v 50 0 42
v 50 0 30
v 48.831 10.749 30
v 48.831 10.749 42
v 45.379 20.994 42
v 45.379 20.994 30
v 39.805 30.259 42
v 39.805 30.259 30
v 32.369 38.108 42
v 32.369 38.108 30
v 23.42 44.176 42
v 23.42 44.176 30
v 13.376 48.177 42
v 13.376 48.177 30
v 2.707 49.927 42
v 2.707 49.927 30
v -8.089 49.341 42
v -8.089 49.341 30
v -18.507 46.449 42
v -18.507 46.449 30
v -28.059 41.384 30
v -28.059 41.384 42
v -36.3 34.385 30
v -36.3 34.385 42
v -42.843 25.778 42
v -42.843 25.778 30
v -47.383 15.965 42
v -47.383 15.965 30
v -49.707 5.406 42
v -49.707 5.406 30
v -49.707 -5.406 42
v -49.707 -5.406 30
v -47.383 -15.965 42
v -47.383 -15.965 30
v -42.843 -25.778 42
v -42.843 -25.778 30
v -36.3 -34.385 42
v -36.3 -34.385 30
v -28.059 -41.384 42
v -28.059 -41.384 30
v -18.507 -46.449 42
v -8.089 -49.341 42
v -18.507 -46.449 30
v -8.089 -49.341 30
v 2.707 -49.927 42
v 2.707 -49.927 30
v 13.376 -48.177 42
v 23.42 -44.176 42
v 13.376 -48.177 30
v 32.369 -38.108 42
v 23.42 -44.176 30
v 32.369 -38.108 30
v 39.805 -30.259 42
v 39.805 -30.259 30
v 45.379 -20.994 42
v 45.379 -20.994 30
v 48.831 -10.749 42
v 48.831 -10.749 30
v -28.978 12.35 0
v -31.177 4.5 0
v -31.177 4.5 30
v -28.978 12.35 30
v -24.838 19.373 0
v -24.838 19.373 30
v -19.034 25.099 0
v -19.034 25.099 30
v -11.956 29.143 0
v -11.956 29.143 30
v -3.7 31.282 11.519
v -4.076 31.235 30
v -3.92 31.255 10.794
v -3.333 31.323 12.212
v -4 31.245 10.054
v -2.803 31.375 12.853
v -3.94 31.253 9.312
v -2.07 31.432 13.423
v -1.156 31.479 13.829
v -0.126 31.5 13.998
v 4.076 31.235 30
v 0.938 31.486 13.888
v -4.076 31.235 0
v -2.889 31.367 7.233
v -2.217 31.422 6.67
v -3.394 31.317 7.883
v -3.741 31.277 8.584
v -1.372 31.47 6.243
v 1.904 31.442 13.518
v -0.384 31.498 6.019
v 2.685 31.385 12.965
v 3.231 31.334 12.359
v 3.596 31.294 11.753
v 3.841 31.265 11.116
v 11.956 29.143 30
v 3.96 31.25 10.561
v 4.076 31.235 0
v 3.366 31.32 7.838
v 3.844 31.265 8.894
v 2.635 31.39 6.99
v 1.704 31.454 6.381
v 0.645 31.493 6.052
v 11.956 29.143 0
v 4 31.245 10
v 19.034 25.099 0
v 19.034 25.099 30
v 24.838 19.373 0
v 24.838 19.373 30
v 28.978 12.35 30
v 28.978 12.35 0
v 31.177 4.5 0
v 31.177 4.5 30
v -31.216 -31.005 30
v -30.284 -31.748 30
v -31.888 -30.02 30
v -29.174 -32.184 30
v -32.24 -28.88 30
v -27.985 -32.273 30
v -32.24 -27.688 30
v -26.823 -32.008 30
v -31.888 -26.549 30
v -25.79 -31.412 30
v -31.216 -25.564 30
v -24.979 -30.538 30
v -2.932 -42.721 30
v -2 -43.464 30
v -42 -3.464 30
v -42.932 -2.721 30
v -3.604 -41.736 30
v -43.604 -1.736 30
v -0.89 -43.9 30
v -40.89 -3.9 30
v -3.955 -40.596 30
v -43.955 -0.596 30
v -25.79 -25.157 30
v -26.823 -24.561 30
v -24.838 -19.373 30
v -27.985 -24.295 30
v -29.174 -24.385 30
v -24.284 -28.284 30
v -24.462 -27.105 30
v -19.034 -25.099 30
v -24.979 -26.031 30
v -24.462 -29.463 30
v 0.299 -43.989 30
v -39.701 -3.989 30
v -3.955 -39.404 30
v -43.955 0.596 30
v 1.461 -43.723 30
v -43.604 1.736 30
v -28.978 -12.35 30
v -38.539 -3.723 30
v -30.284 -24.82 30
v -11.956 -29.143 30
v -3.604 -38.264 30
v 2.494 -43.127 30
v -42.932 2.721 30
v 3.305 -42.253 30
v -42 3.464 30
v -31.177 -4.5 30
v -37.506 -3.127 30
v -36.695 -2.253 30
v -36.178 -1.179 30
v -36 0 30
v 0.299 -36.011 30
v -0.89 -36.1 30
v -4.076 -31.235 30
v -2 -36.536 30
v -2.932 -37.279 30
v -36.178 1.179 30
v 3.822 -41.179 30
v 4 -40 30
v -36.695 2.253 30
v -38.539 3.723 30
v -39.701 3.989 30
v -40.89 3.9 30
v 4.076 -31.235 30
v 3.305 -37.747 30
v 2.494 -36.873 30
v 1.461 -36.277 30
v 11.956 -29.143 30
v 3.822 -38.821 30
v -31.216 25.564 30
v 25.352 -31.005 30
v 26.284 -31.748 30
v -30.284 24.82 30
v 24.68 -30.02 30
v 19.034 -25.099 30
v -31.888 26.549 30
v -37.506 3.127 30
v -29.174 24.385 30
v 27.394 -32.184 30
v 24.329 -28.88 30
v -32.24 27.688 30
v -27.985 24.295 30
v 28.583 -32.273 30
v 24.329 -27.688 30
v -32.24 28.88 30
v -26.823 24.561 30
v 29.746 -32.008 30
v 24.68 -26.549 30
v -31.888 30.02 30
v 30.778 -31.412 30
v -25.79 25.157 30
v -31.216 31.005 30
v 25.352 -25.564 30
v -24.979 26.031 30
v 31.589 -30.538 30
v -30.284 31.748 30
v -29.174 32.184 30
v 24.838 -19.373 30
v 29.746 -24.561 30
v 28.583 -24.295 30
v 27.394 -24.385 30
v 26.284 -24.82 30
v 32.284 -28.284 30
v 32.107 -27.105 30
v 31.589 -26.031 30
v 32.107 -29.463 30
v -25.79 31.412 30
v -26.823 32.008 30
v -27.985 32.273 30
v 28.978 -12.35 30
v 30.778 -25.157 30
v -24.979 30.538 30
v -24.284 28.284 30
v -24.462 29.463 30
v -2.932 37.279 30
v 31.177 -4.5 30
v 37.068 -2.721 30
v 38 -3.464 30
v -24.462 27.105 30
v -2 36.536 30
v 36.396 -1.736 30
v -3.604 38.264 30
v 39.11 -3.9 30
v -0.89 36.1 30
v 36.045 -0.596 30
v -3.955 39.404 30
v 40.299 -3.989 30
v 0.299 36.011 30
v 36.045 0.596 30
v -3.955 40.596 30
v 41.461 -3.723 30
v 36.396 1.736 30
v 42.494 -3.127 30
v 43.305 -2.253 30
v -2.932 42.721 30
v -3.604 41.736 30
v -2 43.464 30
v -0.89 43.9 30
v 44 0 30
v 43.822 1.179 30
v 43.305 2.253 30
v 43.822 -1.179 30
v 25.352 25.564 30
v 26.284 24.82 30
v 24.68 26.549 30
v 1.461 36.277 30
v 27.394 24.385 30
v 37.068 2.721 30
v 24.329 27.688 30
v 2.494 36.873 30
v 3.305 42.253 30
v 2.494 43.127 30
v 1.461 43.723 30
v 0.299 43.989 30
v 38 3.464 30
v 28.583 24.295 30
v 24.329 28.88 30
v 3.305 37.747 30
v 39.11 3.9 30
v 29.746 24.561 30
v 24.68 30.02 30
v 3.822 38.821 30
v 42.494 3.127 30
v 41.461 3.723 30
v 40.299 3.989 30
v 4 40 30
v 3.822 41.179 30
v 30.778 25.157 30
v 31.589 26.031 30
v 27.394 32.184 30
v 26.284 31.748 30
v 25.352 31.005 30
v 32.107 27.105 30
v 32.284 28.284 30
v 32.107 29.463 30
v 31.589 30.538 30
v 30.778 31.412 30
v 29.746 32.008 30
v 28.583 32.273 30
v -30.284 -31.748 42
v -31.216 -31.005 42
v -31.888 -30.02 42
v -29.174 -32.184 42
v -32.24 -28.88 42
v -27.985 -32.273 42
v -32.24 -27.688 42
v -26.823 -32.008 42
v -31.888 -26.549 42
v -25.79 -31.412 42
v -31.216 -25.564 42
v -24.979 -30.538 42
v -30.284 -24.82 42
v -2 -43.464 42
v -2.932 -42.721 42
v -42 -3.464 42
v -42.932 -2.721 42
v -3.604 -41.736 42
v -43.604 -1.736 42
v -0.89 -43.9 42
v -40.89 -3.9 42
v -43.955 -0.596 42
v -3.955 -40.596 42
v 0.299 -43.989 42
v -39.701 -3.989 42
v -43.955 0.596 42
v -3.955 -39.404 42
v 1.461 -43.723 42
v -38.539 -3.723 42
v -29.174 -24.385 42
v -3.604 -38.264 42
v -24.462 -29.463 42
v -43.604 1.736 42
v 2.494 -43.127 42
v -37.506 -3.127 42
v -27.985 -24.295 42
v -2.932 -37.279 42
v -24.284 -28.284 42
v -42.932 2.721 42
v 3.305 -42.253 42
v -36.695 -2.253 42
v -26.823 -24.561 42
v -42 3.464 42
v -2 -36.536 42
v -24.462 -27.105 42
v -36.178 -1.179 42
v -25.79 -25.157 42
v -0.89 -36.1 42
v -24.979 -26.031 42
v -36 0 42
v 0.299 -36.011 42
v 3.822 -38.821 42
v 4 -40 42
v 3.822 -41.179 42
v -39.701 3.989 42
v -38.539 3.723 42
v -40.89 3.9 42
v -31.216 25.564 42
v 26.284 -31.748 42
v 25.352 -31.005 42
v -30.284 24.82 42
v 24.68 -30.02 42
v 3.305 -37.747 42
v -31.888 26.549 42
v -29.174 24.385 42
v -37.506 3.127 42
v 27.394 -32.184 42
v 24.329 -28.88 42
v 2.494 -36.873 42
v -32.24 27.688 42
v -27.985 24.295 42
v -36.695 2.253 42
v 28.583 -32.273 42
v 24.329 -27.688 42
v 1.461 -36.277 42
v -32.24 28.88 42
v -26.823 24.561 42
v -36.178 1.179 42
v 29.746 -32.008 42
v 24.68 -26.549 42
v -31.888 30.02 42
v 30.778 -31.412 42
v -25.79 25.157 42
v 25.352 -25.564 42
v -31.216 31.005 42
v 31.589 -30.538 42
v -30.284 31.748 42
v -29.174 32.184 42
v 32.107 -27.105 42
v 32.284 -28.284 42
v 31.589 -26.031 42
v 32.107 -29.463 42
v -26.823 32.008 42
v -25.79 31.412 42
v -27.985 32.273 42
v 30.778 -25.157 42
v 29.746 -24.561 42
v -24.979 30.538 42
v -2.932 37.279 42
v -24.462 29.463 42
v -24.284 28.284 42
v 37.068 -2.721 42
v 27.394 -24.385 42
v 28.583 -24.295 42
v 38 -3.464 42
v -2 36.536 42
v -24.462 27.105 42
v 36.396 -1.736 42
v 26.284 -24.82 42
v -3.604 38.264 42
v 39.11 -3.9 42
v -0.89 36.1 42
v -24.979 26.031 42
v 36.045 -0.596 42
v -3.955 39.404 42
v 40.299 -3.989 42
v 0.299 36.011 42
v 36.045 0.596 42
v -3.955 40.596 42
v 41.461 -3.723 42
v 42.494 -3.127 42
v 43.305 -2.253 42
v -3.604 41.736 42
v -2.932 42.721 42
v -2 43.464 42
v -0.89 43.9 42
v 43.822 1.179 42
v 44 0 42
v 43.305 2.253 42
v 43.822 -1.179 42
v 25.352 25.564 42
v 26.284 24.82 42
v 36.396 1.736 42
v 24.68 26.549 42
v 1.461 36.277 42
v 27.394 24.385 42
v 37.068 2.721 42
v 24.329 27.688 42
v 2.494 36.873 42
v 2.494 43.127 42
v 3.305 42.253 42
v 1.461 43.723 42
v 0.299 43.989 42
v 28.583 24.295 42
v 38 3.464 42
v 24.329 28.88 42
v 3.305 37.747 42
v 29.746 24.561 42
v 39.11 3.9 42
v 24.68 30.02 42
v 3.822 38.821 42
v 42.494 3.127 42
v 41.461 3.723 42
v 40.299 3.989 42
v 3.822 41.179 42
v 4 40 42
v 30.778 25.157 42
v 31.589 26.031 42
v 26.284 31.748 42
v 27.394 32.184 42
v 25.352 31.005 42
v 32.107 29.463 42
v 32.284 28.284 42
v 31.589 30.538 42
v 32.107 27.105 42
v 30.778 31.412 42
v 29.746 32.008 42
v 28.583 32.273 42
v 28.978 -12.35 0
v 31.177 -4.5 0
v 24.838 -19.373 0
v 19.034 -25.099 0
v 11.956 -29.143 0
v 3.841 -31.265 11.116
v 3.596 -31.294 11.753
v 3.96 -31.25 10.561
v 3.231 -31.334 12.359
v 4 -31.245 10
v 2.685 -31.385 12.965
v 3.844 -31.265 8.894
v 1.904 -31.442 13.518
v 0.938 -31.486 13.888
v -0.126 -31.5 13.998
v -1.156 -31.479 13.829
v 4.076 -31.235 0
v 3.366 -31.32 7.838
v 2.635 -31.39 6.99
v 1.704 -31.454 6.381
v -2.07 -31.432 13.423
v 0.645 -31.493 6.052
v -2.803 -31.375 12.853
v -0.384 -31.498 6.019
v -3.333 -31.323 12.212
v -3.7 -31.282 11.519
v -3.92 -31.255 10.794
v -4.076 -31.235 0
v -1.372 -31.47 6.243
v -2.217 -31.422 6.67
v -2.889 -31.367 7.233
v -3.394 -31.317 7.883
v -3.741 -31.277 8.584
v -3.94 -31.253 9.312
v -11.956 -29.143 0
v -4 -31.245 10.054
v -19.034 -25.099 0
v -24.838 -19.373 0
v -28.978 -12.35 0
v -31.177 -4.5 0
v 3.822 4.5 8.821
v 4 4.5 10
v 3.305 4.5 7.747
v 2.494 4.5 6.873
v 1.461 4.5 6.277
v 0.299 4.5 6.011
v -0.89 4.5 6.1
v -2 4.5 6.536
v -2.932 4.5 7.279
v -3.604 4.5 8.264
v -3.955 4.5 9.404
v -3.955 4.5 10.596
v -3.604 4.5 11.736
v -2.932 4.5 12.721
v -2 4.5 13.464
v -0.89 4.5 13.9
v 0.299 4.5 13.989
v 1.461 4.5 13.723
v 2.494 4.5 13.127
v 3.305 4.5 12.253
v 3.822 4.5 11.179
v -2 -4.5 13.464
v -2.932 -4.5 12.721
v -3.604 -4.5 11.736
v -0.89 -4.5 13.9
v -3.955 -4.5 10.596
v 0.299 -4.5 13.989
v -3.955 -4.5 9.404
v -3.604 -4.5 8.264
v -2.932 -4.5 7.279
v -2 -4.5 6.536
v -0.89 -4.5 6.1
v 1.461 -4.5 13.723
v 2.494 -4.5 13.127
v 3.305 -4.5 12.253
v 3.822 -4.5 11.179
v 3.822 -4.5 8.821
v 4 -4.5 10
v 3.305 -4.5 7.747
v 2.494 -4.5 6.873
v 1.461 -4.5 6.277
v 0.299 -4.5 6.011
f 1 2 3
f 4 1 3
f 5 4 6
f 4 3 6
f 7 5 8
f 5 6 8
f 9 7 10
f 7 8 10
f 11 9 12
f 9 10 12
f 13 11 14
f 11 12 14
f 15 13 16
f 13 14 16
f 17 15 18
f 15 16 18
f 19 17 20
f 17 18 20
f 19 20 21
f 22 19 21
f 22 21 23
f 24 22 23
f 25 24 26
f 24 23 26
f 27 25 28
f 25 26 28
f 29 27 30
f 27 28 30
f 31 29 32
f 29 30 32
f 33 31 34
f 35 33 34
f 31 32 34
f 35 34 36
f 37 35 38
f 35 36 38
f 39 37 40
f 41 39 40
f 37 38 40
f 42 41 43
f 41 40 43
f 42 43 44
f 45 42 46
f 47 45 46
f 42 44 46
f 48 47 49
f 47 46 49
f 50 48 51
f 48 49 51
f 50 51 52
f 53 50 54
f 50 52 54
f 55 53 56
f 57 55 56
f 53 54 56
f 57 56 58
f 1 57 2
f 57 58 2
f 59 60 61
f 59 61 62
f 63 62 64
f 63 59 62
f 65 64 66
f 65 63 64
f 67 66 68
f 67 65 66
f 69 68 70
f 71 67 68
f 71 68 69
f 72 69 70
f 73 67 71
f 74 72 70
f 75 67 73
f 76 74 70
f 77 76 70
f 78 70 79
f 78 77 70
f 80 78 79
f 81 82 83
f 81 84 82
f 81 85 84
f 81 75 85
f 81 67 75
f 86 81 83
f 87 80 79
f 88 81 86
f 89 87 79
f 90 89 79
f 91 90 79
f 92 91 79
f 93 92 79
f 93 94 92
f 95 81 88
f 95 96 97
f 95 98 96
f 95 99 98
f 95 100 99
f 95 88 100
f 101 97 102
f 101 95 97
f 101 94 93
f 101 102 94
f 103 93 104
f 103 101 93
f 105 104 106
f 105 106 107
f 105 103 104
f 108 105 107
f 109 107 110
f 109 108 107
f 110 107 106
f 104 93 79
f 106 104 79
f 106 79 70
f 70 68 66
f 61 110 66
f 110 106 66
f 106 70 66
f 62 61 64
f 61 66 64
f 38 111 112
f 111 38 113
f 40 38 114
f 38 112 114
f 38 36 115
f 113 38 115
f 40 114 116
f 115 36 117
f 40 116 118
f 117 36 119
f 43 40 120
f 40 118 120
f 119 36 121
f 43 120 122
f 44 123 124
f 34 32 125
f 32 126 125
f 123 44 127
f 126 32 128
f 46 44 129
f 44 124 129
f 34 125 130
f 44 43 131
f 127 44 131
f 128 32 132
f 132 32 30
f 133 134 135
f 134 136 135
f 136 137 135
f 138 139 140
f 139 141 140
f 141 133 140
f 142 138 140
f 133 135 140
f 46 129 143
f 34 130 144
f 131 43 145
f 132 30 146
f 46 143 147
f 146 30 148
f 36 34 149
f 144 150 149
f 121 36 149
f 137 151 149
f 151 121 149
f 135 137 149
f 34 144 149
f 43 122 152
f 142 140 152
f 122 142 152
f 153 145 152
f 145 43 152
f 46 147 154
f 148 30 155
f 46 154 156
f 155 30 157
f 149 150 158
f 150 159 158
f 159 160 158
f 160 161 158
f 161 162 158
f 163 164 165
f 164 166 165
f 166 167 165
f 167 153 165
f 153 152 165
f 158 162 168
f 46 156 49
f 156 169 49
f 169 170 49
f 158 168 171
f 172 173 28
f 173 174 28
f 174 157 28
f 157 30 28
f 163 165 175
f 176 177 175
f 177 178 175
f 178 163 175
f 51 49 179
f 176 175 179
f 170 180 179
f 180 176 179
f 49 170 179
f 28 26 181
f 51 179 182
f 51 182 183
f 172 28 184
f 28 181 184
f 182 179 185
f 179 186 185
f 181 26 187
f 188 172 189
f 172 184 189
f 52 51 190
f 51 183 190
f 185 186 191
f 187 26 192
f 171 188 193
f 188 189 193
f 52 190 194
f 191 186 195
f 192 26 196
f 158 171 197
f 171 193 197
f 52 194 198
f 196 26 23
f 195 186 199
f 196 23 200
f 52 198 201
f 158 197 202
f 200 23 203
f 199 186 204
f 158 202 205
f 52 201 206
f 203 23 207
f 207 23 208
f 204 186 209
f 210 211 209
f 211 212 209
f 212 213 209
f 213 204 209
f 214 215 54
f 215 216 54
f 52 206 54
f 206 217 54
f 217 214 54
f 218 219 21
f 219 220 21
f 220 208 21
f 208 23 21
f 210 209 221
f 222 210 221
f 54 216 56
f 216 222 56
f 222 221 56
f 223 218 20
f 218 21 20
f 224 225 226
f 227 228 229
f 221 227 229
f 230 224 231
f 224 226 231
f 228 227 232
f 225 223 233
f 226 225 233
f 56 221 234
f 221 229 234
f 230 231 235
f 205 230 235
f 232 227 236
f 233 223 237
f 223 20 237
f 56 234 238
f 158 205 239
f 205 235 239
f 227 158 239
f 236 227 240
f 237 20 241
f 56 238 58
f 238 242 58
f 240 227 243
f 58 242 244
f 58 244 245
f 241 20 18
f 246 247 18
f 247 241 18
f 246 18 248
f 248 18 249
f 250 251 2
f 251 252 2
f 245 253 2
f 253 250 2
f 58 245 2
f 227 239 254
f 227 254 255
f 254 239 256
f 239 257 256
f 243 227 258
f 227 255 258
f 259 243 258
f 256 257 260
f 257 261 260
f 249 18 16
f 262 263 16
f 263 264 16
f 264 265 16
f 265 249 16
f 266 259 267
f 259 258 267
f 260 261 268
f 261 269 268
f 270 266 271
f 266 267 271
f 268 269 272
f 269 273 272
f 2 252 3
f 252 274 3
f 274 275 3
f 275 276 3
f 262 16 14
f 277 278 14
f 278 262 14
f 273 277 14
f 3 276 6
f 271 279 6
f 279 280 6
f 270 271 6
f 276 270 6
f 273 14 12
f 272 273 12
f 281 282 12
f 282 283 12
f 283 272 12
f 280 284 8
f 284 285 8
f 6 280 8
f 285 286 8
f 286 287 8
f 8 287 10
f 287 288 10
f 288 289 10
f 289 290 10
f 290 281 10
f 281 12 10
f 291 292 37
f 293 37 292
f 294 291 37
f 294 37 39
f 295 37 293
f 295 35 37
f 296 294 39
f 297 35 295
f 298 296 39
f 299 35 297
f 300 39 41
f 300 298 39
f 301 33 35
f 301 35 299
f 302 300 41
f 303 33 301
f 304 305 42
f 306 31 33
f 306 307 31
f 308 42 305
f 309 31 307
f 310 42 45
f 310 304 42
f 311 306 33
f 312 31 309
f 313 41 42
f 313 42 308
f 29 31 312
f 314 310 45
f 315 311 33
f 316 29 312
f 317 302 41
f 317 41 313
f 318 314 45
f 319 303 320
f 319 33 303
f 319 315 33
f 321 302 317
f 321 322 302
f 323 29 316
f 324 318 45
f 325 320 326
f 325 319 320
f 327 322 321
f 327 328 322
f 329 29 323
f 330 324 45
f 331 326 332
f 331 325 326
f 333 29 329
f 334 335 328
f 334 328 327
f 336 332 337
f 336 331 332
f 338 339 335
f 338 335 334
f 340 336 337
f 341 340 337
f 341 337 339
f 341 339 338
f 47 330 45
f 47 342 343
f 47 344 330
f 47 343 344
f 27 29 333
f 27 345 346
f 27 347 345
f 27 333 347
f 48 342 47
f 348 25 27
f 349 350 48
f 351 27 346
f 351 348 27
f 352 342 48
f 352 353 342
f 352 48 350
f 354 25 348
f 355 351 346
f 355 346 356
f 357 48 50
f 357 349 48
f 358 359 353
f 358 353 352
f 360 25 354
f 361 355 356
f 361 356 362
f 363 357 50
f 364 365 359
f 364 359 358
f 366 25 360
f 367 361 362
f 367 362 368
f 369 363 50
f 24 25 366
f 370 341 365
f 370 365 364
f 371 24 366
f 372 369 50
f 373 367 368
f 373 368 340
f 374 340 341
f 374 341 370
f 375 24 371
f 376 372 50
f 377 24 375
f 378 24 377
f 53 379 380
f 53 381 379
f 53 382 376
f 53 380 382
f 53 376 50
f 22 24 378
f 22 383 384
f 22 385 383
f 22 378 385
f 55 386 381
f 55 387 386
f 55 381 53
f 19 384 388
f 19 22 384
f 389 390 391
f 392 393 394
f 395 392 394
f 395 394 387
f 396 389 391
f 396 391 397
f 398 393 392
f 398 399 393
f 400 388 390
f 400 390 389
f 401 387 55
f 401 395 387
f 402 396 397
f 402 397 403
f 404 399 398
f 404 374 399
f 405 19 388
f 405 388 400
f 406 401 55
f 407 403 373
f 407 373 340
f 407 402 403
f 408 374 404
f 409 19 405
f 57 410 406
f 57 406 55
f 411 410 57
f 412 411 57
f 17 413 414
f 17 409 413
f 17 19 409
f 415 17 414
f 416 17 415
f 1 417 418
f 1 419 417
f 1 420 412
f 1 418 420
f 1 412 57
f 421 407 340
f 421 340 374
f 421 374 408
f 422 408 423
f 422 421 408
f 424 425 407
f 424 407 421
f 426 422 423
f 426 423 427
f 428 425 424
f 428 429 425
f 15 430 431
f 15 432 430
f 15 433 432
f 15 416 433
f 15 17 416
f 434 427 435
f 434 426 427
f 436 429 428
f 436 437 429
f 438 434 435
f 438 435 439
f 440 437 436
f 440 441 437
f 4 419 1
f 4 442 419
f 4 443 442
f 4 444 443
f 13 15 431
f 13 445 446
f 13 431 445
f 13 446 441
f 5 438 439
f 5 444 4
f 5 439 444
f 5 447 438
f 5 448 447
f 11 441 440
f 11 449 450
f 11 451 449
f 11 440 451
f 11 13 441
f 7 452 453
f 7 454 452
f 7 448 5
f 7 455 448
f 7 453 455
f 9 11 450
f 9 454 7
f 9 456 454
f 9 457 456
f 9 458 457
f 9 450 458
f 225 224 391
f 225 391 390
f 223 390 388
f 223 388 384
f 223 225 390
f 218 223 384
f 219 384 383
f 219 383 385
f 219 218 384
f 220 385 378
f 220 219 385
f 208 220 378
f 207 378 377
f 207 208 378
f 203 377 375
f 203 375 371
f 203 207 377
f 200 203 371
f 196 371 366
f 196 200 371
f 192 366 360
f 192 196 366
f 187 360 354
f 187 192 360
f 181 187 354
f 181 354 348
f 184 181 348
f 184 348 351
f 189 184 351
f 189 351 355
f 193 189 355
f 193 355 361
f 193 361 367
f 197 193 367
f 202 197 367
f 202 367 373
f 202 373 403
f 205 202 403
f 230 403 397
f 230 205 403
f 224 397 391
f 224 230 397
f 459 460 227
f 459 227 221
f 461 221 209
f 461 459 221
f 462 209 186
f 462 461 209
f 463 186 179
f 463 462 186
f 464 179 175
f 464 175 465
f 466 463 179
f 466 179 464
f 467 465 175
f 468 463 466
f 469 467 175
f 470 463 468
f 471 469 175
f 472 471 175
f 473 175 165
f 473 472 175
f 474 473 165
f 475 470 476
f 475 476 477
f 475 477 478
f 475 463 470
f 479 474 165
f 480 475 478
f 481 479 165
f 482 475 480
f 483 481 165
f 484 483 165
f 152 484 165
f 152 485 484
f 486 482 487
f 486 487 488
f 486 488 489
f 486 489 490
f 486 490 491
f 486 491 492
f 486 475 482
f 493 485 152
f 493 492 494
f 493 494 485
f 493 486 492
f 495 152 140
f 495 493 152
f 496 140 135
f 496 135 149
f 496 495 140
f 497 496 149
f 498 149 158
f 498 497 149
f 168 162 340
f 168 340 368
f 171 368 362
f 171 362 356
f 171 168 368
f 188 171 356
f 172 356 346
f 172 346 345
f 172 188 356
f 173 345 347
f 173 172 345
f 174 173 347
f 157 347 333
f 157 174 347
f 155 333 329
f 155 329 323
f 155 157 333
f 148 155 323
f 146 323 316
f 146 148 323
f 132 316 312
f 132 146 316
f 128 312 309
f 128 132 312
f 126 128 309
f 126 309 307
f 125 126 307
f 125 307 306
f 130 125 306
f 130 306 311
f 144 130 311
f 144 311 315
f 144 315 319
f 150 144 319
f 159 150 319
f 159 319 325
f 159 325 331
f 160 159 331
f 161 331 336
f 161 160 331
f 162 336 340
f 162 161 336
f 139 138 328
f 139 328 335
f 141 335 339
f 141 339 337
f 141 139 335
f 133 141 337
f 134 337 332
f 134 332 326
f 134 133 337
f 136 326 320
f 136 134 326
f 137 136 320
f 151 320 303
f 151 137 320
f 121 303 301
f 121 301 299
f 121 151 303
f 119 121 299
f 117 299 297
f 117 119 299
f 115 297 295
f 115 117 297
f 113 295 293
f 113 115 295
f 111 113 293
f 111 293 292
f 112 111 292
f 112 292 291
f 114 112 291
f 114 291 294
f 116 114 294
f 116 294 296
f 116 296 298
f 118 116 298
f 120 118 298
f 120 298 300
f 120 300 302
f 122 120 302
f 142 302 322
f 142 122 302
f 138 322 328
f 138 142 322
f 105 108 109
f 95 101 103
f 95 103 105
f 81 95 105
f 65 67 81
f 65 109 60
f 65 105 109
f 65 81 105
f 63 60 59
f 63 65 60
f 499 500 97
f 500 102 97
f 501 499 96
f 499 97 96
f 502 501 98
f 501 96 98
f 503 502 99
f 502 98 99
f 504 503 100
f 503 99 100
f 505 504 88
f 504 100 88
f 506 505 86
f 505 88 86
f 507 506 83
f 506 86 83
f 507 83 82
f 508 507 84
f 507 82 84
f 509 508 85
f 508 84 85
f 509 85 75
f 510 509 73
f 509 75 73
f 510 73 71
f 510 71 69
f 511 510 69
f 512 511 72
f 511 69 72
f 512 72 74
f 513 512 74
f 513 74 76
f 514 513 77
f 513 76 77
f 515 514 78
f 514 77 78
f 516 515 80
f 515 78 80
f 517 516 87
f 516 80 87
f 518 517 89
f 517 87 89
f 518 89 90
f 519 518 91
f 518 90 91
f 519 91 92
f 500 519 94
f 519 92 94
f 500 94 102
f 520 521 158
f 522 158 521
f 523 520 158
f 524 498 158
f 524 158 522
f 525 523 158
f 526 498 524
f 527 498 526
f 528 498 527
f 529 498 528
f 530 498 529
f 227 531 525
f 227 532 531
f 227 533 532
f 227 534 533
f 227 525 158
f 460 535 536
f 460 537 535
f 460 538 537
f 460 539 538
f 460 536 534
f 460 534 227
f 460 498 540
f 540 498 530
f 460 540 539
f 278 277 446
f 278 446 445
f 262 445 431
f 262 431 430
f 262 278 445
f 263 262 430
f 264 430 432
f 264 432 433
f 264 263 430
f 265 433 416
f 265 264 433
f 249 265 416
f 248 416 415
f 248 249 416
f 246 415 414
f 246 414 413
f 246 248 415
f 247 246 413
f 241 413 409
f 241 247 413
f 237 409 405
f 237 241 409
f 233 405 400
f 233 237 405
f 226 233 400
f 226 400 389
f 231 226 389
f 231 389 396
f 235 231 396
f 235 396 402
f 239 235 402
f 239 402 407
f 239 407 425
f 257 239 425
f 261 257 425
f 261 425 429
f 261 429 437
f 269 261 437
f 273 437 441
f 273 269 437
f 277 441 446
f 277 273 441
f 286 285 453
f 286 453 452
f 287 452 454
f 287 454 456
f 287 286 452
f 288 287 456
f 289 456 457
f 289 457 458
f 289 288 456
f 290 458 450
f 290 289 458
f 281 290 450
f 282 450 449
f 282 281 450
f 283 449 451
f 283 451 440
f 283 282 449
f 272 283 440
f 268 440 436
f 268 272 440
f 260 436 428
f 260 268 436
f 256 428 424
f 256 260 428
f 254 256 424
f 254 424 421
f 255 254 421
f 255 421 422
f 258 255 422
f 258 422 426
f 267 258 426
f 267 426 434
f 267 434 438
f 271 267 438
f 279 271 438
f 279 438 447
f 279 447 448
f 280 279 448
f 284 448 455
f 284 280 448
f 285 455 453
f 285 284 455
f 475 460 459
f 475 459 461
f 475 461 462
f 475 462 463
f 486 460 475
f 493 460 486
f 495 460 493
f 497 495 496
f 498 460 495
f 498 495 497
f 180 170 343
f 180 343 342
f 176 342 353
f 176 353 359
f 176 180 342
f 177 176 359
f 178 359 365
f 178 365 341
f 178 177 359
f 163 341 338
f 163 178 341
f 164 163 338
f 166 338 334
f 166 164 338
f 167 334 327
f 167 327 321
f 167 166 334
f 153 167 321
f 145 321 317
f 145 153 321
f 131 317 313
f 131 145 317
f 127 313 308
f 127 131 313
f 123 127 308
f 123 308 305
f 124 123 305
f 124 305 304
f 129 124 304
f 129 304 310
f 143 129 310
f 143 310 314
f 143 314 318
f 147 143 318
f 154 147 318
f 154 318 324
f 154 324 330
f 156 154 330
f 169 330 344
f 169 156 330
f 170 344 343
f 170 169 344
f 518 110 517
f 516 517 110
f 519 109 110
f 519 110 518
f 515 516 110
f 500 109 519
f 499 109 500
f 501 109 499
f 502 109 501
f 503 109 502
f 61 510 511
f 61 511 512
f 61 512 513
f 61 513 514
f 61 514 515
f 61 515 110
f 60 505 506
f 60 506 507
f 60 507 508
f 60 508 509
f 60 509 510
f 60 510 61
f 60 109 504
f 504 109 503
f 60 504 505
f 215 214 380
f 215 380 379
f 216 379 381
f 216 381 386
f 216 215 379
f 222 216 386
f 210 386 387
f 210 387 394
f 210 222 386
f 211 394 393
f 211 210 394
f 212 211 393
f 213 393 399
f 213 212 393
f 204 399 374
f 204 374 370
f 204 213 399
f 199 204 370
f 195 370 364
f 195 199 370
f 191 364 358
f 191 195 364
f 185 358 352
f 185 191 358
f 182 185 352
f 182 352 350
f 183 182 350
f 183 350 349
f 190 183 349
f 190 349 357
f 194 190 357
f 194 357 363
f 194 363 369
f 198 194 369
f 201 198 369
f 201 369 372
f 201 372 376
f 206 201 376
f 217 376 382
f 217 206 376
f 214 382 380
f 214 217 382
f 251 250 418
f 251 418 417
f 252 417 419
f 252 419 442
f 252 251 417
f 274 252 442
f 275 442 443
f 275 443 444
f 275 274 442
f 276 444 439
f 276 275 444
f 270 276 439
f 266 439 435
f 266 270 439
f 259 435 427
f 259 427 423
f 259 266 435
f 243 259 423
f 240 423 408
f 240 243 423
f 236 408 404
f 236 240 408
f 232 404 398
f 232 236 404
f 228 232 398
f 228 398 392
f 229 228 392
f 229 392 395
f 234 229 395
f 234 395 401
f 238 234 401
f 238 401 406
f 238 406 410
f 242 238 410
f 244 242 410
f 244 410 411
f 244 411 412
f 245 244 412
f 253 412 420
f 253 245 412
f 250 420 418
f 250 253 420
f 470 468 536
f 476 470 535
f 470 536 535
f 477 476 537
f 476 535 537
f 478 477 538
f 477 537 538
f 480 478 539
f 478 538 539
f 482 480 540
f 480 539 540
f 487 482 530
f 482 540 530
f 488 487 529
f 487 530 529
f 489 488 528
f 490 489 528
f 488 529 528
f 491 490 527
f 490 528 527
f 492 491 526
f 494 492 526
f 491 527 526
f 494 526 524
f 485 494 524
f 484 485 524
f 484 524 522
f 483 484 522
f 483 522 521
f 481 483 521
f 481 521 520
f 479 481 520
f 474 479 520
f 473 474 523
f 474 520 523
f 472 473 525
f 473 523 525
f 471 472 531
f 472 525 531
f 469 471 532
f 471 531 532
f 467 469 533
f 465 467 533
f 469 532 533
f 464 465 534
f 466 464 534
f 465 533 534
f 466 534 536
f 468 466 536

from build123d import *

# Parameters (mm, degrees)
RESSALTO_EXTRUS_O1_DEPTH   = 30
RESSALTO_EXTRUS_O1_2_DEPTH = 30
ESBO_O2_R                  = 4
CORTE_EXTRUS_O1_DEPTH      = 50
ESBO_O6_R                  = 50
ESBO_O6_R_2                = 4
RESSALTO_EXTRUS_O2_DEPTH   = 12


with BuildPart() as part:
    # Esboço1 → Ressalto-extrusão1 (new body)
    with BuildSketch(Plane.XY):
        with BuildLine():
            Line((-14.5, 4.5), (-31.176914536, 4.5))
            ThreePointArc((-31.176914536, 4.5), (0, 31.5), (31.176914536, 4.5))
            Line((31.176914536, 4.5), (14.5, 4.5))
            Line((14.5, 4.5), (-14.5, 4.5))
        make_face()
    extrude(amount=RESSALTO_EXTRUS_O1_DEPTH)


with BuildPart() as body_2:
    # Esboço1 → Ressalto-extrus_o1 2 (new body)
    with BuildSketch(Plane.XY):
        with BuildLine():
            Line((-14.5, -4.5), (14.5, -4.5))
            Line((14.5, -4.5), (31.176914536, -4.5))
            ThreePointArc((31.176914536, -4.5), (0, -31.5), (-31.176914536, -4.5))
            Line((-31.176914536, -4.5), (-14.5, -4.5))
        make_face()
    extrude(amount=RESSALTO_EXTRUS_O1_2_DEPTH)


with BuildPart() as corte_extrus_o1_tool:
    # Esboço2 → Corte-extrusão1 (new body, symmetric)
    with BuildSketch(Plane(origin=(0, 0, 0), x_dir=(1, 0, 0), z_dir=(0, 1, 0))):
        with Locations((0, -10)):
            Circle(ESBO_O2_R)
    extrude(amount=CORTE_EXTRUS_O1_DEPTH, both=True)


with BuildPart() as part_1:
    add(part.part)

    # Corte-extrusão1: cut by corte_extrus_o1_tool
    add(corte_extrus_o1_tool.part, mode=Mode.SUBTRACT)


with BuildPart() as body_2_1:
    add(body_2.part)

    # Corte-extrusão1: cut by corte_extrus_o1_tool
    add(corte_extrus_o1_tool.part, mode=Mode.SUBTRACT)

    # Esboço6 → Ressalto-extrusão2 (add)
    with BuildSketch(Plane.XY.offset(30)):
        Circle(ESBO_O6_R)
        with Locations((40, 0)):
            Circle(ESBO_O6_R_2, mode=Mode.SUBTRACT)
        with Locations((-40, 0)):
            Circle(ESBO_O6_R_2, mode=Mode.SUBTRACT)
        with Locations((-28.284271247, 28.284271247)):
            Circle(ESBO_O6_R_2, mode=Mode.SUBTRACT)
        with Locations((-28.284271247, -28.284271247)):
            Circle(ESBO_O6_R_2, mode=Mode.SUBTRACT)
        with Locations((28.284271247, -28.284271247)):
            Circle(ESBO_O6_R_2, mode=Mode.SUBTRACT)
        with Locations((28.284271247, 28.284271247)):
            Circle(ESBO_O6_R_2, mode=Mode.SUBTRACT)
        with Locations((0, 40)):
            Circle(ESBO_O6_R_2, mode=Mode.SUBTRACT)
        with Locations((0, -40)):
            Circle(ESBO_O6_R_2, mode=Mode.SUBTRACT)
    extrude(amount=RESSALTO_EXTRUS_O2_DEPTH)


solid = Compound([part_1.part, body_2_1.part])
